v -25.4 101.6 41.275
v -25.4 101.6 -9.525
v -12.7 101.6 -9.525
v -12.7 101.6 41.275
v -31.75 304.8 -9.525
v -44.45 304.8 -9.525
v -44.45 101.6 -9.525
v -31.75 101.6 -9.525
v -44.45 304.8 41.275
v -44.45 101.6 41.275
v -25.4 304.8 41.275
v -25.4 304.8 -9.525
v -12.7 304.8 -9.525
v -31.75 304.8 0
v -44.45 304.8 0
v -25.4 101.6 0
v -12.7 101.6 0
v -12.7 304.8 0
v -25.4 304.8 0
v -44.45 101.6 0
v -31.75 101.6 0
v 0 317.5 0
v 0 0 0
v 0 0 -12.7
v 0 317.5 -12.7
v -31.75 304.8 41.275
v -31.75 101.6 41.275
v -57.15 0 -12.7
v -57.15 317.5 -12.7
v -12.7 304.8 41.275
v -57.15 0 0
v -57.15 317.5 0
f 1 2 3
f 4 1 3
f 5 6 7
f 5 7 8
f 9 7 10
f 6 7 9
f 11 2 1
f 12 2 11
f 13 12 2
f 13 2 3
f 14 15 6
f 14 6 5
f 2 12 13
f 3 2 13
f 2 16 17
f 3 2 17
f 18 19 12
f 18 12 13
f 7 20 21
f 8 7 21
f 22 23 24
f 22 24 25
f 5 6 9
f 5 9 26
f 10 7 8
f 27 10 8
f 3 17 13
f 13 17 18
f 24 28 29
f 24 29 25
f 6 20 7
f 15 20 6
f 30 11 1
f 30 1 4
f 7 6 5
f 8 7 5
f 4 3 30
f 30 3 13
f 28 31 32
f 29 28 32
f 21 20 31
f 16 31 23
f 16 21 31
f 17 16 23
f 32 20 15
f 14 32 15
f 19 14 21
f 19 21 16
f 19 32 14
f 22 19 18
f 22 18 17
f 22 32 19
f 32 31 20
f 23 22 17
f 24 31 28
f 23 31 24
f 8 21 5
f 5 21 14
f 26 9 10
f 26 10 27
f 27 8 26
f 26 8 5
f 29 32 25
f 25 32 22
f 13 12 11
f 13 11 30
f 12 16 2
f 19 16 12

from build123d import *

# Parameters (mm, degrees)
F0_W      = 57.15
F0_H      = 317.5
F0_W_2    = 12.7
F0_H_2    = 203.2
F0_W_3    = 1.5875
F0_W_4    = 3.175
F1_DEPTH  = 12.7
F2_DEPTH  = 9.525
F2_FACE_W = 12.7
F2_FACE_H = 203.2
F3_DEPTH  = 50.8


with BuildPart() as f1:
    # F0 (on Top) → F1 (new body)
    with BuildSketch(Plane.XY):
        with Locations((-28.575, 158.75)):
            Rectangle(F0_W, F0_H)
        Polygon((-31.75, 101.6), (-44.45, 101.6), (-44.45, 304.8), (-31.75, 304.8), (-30.1625, 304.8), (-26.9875, 304.8), (-25.4, 304.8), (-12.7, 304.8), (-12.7, 101.6), (-25.4, 101.6), (-26.9875, 101.6), (-30.1625, 101.6), align=None, mode=Mode.SUBTRACT)
        with Locations((-19.05, 203.2)):
            Rectangle(F0_W_2, F0_H_2)
        with Locations((-30.95625, 203.2)):
            Rectangle(F0_W_3, F0_H_2)
        with Locations((-38.1, 203.2)):
            Rectangle(F0_W_2, F0_H_2)
        with Locations((-28.575, 203.2)):
            Rectangle(F0_W_4, F0_H_2)
        with Locations((-26.19375, 203.2)):
            Rectangle(F0_W_3, F0_H_2)
    extrude(amount=-F1_DEPTH)

    # F0 (on Top) → F2 (cut)
    with BuildSketch(Plane.XY):
        with Locations((-38.1, 203.2)):
            Rectangle(F0_W_2, F0_H_2)
        with Locations((-19.05, 203.2)):
            Rectangle(F0_W_2, F0_H_2)
    extrude(amount=-F2_DEPTH, mode=Mode.SUBTRACT)


with BuildPart() as f3:
    # F2_face (on face) → F3 (new body)
    with BuildSketch(Plane(origin=(-38.1, 203.2, -9.525), x_dir=(1, 0, 0), z_dir=(0, 0, 1))):
        Rectangle(F2_FACE_W, F2_FACE_H)
        with Locations((19.05, 0)):
            Rectangle(F2_FACE_W, F2_FACE_H)
    extrude(amount=F3_DEPTH)


solid = Compound([f1.part, f3.part])
